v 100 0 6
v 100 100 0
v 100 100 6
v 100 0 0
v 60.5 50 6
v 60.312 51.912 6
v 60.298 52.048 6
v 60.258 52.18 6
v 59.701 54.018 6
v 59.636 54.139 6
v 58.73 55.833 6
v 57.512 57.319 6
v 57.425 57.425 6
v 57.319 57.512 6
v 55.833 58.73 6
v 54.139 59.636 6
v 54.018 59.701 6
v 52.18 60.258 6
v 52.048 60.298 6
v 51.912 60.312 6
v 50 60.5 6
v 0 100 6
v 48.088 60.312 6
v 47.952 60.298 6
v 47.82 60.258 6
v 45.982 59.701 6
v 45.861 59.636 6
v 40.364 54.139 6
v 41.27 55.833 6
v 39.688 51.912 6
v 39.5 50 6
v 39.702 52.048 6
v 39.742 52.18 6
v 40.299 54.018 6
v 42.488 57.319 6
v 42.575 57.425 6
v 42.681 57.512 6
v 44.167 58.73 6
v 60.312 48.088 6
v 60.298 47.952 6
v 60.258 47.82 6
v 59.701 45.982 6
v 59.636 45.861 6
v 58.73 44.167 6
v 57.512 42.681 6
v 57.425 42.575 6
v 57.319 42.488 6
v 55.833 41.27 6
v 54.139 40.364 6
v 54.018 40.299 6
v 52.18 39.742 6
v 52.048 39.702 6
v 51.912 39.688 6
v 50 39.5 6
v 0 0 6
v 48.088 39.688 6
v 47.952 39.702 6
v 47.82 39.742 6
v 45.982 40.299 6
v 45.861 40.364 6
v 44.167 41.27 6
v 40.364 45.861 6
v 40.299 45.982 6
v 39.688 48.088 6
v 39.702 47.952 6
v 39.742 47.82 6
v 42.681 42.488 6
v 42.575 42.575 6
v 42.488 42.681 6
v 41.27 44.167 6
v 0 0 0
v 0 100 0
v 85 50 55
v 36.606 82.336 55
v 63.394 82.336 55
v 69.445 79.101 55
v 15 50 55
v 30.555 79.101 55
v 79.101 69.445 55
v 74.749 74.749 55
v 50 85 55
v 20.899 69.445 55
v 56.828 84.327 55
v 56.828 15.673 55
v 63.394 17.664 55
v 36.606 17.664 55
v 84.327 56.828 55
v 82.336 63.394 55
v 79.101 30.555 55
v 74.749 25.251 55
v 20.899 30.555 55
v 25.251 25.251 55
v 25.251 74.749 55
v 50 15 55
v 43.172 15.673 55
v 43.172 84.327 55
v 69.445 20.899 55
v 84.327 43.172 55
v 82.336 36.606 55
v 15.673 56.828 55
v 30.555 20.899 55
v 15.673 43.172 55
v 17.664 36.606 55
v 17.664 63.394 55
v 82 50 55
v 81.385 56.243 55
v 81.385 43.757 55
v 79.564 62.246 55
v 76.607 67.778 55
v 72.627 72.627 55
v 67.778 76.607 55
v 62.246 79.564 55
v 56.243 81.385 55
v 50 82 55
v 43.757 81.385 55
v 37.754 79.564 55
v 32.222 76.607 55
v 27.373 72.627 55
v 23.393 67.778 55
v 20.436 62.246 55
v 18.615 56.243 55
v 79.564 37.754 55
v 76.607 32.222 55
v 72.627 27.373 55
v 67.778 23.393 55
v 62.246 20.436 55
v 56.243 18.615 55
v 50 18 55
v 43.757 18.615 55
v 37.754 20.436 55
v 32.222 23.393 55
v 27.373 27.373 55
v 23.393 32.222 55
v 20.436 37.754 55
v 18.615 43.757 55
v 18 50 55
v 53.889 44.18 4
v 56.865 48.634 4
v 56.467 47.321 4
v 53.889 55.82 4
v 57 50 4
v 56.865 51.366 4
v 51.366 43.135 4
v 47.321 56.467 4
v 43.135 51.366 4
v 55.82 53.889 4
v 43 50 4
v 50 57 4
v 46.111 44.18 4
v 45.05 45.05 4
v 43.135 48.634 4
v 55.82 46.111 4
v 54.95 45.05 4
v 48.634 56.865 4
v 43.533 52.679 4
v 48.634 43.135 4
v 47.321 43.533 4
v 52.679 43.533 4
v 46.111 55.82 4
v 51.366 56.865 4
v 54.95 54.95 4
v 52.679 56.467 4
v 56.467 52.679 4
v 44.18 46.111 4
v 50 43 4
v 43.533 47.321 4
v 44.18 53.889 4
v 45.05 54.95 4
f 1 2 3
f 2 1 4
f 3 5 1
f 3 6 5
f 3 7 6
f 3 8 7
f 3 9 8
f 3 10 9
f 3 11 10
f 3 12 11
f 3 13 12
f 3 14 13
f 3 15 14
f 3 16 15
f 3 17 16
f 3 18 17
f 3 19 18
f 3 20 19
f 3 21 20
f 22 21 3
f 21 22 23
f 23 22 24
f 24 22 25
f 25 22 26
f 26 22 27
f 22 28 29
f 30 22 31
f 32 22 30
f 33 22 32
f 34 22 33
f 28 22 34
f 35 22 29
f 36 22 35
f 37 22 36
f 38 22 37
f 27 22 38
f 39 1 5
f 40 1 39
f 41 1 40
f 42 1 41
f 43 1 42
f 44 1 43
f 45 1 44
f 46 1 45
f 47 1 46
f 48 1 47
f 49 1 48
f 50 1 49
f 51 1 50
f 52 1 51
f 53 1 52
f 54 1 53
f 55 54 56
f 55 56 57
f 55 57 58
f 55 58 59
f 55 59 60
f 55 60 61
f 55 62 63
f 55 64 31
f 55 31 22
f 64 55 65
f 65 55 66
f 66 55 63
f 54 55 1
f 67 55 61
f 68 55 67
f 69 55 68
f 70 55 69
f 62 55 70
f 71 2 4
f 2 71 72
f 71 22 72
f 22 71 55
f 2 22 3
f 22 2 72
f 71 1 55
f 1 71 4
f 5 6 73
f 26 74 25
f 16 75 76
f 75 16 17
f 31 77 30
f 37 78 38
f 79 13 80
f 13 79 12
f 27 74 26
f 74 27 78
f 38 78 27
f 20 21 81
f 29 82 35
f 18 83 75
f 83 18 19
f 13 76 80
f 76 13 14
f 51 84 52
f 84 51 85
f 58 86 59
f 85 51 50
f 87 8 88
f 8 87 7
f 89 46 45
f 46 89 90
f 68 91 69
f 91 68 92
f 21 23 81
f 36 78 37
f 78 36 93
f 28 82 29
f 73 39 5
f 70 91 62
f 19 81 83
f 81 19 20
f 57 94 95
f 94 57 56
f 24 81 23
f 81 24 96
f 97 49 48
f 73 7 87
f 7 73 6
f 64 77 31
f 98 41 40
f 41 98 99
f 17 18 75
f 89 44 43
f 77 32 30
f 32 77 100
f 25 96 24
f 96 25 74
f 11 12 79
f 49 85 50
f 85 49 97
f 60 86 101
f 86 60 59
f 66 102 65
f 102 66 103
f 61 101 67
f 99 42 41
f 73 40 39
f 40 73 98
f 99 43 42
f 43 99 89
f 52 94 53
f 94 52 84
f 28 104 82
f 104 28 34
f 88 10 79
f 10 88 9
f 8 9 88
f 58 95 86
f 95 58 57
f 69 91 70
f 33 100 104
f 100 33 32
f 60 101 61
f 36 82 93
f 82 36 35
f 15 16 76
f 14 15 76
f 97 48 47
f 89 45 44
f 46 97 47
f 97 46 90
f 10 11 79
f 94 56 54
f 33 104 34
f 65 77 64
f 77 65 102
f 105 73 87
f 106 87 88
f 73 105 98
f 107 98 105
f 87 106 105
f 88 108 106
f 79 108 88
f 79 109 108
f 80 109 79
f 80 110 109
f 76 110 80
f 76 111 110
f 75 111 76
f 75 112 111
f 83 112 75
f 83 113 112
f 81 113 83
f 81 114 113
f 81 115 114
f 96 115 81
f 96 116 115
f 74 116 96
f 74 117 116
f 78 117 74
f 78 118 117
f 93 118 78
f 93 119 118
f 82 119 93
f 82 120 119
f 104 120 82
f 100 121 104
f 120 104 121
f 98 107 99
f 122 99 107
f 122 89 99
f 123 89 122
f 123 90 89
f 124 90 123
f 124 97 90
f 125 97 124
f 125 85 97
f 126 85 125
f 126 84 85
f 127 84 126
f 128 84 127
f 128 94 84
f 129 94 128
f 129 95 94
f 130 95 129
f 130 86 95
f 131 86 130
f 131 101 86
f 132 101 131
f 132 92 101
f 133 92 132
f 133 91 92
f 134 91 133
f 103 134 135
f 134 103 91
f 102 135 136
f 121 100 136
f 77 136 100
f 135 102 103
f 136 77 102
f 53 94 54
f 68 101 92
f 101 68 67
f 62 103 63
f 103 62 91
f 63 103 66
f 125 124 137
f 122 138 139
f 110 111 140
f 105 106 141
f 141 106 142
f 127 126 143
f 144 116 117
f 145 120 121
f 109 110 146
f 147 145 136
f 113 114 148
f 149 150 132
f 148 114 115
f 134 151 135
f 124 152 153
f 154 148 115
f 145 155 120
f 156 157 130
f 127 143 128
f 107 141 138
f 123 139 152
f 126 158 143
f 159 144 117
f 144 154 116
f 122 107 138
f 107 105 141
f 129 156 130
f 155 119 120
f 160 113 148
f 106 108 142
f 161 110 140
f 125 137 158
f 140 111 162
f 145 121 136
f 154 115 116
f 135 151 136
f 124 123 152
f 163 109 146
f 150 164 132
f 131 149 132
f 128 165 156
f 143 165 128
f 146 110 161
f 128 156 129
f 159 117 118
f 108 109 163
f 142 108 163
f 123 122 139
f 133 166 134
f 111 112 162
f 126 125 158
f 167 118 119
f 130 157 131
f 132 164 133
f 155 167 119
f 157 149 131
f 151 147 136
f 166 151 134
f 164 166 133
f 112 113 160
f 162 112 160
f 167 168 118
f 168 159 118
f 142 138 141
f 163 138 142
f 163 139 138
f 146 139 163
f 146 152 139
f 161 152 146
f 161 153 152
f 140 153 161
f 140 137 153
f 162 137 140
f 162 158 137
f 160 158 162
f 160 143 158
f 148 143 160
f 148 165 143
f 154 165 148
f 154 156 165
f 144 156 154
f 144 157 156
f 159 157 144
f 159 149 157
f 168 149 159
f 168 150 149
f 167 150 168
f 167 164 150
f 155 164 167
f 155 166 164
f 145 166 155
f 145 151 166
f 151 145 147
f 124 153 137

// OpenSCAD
$fn = 32;

// ----------------------------------------------------------------------
// Hopper: funnel with square flange
// ----------------------------------------------------------------------

// --- parameters (mm) ---
fl = 100;                 // flange side, X and Y
fl_t = 6;                 // flange thickness
cone_h = 50;              // cone height above the flange
top_d = 70;               // cone mouth diameter
bot_d = 20;               // cone spout diameter
wall = 3;                 // cone wall thickness

bore_d = bot_d - 2 * wall;  // spout bore diameter
total_h = fl_t + cone_h - 1;  // overall height

difference() {
  union() {
    cube([fl, fl, fl_t]);
    translate([fl / 2, fl / 2, fl_t - 1])
      cylinder(h = cone_h, d1 = bot_d, d2 = top_d);
  }
  translate([fl / 2, fl / 2, fl_t - 2])
    cylinder(h = cone_h + 1, d1 = bore_d, d2 = top_d - 2 * wall);
}
